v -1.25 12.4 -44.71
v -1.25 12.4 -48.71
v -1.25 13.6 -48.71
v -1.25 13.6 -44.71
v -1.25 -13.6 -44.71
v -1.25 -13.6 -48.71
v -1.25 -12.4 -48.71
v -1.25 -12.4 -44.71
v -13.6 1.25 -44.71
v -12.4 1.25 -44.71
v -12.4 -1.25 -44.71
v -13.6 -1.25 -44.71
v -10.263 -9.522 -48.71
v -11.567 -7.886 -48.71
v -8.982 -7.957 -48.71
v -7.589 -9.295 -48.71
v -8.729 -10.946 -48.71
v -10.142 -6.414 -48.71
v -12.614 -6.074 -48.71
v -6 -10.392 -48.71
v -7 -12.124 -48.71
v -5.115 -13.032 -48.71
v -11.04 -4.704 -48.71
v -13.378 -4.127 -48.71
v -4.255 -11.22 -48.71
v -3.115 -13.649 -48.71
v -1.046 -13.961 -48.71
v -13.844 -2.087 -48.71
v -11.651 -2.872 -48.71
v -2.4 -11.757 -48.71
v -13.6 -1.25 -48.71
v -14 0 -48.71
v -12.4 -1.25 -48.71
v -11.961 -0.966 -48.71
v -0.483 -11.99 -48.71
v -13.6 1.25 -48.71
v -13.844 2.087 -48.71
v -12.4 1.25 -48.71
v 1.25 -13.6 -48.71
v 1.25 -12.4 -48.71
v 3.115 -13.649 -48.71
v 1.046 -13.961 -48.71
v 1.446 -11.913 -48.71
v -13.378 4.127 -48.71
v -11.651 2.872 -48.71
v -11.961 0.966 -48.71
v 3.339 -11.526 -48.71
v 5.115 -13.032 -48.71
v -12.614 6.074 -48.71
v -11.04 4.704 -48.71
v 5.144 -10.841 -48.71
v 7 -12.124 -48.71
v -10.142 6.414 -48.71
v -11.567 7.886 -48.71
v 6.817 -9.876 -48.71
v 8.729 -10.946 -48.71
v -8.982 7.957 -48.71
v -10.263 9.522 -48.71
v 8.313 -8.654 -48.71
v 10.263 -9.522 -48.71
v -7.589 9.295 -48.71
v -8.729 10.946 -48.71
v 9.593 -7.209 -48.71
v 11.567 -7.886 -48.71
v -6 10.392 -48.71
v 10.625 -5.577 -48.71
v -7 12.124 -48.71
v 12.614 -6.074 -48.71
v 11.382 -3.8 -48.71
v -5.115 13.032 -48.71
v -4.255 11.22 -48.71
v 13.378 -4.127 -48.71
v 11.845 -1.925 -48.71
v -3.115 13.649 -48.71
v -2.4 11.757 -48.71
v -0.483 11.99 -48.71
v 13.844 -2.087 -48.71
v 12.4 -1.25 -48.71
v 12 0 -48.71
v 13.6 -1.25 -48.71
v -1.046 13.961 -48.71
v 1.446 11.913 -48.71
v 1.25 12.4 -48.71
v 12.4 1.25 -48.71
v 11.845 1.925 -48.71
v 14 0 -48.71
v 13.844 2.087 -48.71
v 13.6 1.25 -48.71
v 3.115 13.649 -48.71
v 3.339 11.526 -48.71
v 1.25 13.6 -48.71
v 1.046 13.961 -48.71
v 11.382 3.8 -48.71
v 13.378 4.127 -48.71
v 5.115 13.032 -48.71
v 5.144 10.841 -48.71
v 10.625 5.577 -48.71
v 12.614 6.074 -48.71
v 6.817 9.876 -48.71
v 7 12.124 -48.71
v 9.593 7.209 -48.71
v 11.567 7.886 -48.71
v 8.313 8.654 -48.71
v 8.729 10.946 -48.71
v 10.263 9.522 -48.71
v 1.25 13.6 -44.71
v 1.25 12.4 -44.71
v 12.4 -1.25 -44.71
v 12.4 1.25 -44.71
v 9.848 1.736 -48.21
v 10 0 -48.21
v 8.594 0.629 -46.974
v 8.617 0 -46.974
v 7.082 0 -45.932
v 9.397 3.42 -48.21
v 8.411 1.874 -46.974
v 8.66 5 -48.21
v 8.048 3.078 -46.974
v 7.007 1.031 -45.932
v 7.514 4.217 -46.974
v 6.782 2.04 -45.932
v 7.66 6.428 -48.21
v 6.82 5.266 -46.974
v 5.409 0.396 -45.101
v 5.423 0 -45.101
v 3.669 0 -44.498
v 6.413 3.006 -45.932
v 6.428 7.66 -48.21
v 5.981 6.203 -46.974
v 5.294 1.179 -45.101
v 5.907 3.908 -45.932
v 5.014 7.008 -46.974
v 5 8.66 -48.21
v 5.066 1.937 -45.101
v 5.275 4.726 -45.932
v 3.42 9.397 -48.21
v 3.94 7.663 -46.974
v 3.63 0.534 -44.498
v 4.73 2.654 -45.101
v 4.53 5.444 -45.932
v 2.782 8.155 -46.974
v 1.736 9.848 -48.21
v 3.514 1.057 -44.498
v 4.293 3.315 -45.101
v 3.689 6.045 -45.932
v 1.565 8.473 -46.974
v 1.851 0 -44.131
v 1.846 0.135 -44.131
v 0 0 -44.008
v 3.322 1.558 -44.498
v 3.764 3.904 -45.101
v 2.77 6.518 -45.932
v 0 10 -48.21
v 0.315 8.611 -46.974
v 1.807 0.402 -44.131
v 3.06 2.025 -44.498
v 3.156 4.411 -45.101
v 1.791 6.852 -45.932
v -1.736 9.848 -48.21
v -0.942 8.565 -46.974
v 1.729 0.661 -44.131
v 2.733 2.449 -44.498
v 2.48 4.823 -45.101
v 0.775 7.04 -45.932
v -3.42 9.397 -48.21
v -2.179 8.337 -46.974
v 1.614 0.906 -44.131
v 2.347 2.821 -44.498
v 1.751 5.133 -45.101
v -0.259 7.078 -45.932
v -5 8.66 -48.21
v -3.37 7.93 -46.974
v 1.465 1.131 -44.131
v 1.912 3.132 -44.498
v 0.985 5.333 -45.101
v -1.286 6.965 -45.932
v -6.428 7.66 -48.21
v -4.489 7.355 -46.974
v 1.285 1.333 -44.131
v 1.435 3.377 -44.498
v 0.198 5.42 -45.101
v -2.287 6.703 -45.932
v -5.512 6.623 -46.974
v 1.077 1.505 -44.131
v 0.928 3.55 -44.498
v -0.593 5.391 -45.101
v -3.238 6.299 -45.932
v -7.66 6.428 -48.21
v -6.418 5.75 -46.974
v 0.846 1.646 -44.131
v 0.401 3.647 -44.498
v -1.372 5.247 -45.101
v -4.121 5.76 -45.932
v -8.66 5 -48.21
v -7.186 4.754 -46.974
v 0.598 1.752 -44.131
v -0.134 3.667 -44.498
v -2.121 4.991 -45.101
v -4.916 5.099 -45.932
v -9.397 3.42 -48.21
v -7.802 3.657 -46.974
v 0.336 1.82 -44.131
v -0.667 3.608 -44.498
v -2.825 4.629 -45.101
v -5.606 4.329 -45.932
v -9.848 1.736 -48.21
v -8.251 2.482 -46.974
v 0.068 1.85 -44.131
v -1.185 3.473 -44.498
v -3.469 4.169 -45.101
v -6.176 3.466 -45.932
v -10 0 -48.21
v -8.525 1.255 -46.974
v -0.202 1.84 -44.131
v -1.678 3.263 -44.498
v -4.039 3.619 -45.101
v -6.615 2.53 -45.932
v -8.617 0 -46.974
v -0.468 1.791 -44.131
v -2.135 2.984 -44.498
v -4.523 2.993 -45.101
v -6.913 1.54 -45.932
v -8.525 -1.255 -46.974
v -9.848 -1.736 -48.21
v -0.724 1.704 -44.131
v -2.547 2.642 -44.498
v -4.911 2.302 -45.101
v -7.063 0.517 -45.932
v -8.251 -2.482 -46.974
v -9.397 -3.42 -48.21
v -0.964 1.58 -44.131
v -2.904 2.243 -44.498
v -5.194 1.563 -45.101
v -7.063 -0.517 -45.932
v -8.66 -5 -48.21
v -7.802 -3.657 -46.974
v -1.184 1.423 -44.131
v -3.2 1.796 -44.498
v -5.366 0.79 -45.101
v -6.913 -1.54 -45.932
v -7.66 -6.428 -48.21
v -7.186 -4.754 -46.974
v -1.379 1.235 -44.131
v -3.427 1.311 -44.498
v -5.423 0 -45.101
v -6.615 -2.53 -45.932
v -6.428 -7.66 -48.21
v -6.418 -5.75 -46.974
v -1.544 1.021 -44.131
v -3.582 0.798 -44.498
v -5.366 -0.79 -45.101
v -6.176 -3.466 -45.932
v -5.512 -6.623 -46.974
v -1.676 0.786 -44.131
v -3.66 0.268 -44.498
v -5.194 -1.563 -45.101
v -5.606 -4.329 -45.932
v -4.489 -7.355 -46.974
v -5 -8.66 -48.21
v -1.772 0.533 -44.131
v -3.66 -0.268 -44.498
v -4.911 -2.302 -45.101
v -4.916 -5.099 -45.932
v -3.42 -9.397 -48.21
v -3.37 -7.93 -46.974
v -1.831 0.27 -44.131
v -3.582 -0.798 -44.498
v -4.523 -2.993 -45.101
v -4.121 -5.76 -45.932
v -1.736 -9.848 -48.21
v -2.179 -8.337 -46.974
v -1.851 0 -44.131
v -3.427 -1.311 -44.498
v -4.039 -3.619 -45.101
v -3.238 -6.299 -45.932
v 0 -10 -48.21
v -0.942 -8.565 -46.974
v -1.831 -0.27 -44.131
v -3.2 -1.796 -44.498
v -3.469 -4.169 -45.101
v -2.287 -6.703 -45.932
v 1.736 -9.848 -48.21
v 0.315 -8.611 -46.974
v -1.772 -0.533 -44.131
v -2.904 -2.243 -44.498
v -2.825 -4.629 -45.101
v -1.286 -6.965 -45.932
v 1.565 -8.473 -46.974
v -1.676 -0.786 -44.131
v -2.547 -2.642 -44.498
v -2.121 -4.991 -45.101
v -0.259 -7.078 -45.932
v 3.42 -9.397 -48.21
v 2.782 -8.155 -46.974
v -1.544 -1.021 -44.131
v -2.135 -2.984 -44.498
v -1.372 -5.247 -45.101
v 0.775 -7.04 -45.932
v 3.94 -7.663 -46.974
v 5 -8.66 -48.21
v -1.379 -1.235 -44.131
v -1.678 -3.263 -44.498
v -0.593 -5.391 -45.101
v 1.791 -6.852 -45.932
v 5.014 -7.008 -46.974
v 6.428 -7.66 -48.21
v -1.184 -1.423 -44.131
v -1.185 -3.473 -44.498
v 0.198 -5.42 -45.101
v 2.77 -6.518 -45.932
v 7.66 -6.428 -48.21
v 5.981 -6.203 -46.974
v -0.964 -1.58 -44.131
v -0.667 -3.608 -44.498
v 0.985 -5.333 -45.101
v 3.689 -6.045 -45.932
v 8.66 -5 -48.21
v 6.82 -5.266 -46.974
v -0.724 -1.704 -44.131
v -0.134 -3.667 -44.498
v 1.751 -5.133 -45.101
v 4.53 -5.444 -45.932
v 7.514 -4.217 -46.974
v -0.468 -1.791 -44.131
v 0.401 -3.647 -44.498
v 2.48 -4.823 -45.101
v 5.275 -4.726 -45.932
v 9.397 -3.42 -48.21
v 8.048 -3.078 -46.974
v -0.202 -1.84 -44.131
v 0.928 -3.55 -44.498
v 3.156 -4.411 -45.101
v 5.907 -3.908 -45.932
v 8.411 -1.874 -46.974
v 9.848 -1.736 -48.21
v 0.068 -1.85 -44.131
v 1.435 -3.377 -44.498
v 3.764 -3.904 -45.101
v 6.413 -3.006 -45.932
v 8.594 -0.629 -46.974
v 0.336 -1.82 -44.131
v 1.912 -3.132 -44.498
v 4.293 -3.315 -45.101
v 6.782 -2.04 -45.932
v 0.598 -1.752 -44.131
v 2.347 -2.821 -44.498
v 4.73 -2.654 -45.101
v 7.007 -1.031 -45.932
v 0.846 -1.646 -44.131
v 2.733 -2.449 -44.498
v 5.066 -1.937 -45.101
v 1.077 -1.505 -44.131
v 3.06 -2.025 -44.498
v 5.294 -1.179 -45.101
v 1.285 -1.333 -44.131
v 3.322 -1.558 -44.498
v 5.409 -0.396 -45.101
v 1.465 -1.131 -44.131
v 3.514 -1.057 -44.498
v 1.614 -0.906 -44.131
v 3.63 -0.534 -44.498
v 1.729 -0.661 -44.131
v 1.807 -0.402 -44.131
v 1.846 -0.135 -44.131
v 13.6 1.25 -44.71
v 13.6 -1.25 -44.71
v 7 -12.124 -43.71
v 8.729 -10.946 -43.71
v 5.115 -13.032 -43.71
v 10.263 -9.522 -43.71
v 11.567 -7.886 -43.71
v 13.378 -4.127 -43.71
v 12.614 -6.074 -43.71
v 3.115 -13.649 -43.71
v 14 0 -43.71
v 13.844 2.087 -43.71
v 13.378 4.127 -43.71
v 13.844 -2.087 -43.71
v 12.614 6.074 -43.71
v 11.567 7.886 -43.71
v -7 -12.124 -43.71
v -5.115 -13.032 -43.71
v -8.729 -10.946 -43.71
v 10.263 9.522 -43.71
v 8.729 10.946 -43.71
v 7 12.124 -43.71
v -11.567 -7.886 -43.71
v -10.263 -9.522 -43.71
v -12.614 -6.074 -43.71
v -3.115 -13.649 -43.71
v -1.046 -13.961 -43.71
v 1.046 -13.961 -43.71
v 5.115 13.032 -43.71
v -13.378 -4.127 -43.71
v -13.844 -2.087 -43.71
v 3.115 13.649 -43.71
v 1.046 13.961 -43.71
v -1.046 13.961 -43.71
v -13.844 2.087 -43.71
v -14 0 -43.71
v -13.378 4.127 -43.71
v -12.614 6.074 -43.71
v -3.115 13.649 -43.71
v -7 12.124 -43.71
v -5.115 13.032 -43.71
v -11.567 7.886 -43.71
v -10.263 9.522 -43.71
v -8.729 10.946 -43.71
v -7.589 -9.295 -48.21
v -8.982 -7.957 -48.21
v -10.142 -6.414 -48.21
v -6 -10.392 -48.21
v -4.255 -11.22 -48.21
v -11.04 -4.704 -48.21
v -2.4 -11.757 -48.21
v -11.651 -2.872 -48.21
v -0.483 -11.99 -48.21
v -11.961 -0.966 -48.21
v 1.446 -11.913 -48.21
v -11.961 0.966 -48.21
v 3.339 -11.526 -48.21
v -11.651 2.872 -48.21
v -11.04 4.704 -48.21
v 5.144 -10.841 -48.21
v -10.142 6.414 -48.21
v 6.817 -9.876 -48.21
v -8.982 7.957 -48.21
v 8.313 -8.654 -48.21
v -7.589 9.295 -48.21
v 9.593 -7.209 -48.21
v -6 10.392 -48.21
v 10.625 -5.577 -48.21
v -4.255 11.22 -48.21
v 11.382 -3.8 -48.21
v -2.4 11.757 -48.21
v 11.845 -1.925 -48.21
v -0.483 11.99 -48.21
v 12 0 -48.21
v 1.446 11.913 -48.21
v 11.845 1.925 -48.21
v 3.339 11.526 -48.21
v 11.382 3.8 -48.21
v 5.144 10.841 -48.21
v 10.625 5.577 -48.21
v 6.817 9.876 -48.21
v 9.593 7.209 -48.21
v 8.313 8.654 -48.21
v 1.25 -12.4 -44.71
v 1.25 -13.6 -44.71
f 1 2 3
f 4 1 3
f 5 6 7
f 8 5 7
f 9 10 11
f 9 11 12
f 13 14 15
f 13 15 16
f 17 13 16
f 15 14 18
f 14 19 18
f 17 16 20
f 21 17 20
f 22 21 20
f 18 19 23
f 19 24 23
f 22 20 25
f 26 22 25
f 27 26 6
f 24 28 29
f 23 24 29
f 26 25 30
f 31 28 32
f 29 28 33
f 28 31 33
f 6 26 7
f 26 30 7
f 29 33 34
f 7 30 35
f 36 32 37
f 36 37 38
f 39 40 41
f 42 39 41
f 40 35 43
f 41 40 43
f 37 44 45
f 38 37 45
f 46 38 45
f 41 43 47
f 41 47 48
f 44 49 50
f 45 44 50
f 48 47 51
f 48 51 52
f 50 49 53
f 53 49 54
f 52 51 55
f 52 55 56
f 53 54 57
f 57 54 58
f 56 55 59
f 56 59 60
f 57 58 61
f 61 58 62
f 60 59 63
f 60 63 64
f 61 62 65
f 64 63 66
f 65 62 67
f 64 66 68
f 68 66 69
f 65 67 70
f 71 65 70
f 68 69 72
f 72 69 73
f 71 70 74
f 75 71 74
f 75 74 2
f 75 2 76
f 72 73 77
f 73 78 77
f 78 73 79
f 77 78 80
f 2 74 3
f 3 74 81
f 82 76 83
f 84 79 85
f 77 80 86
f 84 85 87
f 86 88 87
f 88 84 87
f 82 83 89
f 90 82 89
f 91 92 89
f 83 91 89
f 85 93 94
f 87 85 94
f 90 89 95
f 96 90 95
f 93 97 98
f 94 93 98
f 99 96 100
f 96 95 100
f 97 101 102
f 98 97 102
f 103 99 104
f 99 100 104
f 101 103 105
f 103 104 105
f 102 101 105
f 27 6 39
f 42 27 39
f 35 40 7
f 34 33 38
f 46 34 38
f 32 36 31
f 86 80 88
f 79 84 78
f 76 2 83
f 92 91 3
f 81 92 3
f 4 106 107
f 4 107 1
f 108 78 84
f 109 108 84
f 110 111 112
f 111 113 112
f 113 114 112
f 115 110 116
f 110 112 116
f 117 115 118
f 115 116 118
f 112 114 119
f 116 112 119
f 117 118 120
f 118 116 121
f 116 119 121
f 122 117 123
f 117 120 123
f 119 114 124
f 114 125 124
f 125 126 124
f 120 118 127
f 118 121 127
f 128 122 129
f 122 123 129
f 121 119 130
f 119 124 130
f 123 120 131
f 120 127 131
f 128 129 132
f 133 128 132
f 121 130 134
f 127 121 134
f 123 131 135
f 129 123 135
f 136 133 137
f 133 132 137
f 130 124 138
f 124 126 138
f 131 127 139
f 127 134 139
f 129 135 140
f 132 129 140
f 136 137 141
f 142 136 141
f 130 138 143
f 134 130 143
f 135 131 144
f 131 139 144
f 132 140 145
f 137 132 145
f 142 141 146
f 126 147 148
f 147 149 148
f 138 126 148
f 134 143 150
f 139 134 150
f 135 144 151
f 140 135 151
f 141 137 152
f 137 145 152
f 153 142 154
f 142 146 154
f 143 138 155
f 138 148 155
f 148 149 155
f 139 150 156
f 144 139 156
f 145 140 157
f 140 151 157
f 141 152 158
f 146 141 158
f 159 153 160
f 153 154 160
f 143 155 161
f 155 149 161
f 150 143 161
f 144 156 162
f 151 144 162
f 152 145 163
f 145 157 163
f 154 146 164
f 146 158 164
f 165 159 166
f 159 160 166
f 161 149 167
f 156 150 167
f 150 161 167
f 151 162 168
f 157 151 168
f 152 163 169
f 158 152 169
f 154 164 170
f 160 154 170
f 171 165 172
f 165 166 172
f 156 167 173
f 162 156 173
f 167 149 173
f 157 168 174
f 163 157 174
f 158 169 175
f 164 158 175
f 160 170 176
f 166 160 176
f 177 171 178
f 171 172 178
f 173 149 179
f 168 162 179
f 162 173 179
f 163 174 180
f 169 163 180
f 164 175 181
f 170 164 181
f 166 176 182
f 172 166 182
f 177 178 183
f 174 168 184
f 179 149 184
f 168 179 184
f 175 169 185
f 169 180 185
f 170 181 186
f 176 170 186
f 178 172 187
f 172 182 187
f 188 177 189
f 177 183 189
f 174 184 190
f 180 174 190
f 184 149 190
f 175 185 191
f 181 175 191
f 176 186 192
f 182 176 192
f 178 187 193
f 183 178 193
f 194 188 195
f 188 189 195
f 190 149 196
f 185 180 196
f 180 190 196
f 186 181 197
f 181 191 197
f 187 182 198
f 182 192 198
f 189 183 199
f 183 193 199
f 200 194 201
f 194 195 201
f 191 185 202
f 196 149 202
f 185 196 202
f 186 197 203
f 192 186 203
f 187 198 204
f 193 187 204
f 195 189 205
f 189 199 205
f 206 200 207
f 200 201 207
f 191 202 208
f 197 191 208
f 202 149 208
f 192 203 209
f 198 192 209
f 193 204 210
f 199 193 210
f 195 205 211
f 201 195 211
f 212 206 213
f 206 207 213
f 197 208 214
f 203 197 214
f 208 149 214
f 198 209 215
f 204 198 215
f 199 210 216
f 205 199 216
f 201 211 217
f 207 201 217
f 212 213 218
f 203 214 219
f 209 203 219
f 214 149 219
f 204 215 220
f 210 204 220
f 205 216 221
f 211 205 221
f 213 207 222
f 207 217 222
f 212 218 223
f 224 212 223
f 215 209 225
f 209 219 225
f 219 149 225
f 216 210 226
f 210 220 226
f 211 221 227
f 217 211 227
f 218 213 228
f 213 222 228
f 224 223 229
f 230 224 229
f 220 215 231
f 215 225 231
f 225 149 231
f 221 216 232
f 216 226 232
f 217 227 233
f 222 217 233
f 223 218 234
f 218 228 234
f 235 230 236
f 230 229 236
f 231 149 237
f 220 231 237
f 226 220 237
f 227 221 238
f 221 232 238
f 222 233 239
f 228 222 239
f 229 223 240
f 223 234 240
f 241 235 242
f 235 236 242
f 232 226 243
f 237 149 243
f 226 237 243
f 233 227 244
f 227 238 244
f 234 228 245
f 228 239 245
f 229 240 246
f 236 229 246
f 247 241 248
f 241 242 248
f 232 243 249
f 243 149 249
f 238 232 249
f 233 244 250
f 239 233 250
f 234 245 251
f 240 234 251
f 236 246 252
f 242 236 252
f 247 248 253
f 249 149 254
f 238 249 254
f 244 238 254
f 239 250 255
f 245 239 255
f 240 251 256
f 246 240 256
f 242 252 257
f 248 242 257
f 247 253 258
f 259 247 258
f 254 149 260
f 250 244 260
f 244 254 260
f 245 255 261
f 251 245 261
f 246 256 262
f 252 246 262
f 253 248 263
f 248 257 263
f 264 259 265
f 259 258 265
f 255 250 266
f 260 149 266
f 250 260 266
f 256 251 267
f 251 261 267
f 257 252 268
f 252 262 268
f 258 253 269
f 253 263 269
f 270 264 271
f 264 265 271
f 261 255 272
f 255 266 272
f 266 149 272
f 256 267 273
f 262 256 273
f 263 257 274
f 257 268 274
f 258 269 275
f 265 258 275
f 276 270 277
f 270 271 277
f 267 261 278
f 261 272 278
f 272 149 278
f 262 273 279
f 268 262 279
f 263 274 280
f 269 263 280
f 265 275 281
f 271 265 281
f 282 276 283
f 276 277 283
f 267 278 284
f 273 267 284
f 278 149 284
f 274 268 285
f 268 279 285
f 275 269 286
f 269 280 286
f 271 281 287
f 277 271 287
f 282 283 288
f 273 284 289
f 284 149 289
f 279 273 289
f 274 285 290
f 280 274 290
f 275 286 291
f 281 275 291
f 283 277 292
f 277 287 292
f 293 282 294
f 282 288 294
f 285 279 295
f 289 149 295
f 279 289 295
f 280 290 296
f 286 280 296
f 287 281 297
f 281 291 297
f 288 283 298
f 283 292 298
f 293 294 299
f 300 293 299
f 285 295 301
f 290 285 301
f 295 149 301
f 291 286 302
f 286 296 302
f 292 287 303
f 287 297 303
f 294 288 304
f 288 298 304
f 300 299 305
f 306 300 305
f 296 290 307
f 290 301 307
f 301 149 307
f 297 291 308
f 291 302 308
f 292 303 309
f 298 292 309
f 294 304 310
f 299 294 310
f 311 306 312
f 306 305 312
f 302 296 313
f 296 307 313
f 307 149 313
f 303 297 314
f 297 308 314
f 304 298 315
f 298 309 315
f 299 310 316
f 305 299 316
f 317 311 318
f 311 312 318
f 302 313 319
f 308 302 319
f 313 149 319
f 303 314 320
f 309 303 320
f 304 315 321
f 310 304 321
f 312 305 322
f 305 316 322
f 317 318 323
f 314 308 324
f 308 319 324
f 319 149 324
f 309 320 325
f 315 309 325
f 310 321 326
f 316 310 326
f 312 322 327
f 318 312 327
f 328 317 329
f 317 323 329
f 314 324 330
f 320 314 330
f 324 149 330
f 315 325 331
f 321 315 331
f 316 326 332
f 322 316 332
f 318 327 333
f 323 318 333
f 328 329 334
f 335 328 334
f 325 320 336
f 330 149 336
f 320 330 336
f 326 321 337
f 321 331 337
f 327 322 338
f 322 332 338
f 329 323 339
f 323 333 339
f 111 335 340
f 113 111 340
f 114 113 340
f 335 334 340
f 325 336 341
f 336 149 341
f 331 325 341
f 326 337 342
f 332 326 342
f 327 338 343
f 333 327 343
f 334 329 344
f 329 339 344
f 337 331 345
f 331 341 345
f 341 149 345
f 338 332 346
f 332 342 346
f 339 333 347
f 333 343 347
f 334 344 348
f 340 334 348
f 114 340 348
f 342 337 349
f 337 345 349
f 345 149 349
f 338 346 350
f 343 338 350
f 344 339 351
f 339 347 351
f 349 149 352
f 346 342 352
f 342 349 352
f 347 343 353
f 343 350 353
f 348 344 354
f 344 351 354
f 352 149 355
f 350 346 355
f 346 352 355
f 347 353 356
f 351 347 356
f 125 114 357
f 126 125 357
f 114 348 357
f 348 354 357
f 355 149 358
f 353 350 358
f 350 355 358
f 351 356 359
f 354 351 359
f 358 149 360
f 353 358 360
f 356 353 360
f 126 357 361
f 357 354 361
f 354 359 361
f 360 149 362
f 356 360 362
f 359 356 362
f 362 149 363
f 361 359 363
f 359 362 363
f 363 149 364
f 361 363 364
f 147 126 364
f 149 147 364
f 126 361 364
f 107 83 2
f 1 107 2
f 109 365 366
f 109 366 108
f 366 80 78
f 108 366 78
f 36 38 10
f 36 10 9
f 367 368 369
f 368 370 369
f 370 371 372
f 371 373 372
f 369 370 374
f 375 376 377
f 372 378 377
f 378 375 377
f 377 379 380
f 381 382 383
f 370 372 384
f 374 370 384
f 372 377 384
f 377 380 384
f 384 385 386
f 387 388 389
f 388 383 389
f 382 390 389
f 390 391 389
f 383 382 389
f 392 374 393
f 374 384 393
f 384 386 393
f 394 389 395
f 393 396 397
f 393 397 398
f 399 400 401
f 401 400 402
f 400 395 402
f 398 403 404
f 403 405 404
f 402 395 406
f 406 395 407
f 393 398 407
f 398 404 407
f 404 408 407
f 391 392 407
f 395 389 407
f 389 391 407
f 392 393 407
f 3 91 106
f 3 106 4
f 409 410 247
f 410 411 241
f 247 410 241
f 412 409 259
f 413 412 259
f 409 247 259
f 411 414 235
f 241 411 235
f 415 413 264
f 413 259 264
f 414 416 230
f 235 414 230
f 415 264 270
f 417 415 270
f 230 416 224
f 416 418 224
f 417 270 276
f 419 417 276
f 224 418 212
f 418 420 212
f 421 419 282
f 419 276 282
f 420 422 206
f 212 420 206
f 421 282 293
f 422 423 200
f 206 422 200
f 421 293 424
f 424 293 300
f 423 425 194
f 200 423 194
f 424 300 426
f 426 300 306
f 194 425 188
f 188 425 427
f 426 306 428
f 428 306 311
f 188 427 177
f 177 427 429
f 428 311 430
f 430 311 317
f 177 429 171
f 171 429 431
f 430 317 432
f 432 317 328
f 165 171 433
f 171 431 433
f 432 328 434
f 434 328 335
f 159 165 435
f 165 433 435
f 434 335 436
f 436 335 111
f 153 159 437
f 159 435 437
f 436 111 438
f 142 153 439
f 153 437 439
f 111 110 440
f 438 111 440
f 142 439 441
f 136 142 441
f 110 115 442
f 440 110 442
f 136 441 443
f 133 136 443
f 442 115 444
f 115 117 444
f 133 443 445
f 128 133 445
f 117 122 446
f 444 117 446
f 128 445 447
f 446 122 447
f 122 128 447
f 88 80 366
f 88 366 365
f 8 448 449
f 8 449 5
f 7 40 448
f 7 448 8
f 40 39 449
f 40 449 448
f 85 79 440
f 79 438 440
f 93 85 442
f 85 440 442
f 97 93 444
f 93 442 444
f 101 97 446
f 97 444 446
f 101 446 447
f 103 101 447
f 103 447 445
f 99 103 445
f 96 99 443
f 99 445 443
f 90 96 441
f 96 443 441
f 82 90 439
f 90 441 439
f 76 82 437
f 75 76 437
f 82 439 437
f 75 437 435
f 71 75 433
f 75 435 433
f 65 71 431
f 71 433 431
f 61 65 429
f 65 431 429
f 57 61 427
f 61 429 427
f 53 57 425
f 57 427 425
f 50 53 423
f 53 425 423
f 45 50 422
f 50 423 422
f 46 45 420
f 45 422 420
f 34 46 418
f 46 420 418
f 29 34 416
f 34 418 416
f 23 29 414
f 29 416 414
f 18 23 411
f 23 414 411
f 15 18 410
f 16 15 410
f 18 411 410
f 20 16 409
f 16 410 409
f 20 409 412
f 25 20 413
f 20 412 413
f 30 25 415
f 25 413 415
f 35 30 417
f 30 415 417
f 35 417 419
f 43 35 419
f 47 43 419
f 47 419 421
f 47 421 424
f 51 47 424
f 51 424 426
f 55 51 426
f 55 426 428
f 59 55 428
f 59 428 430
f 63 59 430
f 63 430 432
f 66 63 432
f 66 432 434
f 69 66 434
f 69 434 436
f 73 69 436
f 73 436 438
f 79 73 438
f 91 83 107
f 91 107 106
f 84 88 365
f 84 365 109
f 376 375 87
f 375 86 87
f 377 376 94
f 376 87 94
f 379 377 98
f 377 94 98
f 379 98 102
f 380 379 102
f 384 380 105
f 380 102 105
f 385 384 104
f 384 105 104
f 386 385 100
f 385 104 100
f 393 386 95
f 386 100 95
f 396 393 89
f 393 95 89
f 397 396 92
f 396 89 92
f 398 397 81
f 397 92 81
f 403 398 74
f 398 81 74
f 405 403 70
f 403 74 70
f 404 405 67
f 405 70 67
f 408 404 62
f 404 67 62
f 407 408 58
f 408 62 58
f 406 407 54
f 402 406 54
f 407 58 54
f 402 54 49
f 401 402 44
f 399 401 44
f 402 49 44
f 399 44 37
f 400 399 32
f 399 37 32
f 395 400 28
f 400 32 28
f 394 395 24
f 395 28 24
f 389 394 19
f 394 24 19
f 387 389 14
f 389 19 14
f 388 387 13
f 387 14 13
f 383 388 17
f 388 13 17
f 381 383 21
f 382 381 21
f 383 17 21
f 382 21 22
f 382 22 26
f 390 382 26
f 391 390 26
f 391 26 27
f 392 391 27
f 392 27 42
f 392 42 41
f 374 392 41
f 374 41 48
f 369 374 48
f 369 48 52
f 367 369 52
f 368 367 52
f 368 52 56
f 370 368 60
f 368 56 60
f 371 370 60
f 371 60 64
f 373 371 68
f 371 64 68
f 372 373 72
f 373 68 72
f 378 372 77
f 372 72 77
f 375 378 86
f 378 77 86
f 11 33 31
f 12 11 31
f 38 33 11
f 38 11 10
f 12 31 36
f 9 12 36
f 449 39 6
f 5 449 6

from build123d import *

# Parameters (mm, degrees)
SKETCH2_W          = 2.5
SKETCH2_H          = 1.2
SKETCH2_W_2        = 1.2
SKETCH2_H_2        = 2.5
CUT_EXTRUDE1_DEPTH = 4


with BuildPart() as part:
    # Sketch1 → Revolve1 (revolve)
    with BuildSketch(Plane(origin=(0, 0, 0), x_dir=(1, 0, 0), z_dir=(0, 1, 0))):
        with BuildLine():
            ThreePointArc((10, 48.210245834), (5.423494003, 45.101396028), (0, 44.008204805))
            Line((0, 44.008204805), (0, 43.710245834))
            Line((0, 43.710245834), (14, 43.710245834))
            Line((14, 43.710245834), (14, 48.710245834))
            Line((14, 48.710245834), (12, 48.710245834))
            Line((12, 48.710245834), (12, 48.210245834))
            Line((12, 48.210245834), (10, 48.210245834))
        make_face()
    revolve(axis=Axis((0, 0, -48.710245834), (0, 0, 1)))

    # Sketch2 → Cut-Extrude1 (cut)
    with BuildSketch(Plane(origin=(0, 0, -48.710245834), x_dir=(-1, 0, 0), z_dir=(0, 0, -1))):
        with Locations((0, 13)):
            Rectangle(SKETCH2_W, SKETCH2_H)
        with Locations((-13, 0)):
            Rectangle(SKETCH2_W_2, SKETCH2_H_2)
        with Locations((13, 0)):
            Rectangle(SKETCH2_W_2, SKETCH2_H_2)
        with Locations((0, -13)):
            Rectangle(SKETCH2_W, SKETCH2_H)
    extrude(amount=-CUT_EXTRUDE1_DEPTH, mode=Mode.SUBTRACT)


solid = part.part
